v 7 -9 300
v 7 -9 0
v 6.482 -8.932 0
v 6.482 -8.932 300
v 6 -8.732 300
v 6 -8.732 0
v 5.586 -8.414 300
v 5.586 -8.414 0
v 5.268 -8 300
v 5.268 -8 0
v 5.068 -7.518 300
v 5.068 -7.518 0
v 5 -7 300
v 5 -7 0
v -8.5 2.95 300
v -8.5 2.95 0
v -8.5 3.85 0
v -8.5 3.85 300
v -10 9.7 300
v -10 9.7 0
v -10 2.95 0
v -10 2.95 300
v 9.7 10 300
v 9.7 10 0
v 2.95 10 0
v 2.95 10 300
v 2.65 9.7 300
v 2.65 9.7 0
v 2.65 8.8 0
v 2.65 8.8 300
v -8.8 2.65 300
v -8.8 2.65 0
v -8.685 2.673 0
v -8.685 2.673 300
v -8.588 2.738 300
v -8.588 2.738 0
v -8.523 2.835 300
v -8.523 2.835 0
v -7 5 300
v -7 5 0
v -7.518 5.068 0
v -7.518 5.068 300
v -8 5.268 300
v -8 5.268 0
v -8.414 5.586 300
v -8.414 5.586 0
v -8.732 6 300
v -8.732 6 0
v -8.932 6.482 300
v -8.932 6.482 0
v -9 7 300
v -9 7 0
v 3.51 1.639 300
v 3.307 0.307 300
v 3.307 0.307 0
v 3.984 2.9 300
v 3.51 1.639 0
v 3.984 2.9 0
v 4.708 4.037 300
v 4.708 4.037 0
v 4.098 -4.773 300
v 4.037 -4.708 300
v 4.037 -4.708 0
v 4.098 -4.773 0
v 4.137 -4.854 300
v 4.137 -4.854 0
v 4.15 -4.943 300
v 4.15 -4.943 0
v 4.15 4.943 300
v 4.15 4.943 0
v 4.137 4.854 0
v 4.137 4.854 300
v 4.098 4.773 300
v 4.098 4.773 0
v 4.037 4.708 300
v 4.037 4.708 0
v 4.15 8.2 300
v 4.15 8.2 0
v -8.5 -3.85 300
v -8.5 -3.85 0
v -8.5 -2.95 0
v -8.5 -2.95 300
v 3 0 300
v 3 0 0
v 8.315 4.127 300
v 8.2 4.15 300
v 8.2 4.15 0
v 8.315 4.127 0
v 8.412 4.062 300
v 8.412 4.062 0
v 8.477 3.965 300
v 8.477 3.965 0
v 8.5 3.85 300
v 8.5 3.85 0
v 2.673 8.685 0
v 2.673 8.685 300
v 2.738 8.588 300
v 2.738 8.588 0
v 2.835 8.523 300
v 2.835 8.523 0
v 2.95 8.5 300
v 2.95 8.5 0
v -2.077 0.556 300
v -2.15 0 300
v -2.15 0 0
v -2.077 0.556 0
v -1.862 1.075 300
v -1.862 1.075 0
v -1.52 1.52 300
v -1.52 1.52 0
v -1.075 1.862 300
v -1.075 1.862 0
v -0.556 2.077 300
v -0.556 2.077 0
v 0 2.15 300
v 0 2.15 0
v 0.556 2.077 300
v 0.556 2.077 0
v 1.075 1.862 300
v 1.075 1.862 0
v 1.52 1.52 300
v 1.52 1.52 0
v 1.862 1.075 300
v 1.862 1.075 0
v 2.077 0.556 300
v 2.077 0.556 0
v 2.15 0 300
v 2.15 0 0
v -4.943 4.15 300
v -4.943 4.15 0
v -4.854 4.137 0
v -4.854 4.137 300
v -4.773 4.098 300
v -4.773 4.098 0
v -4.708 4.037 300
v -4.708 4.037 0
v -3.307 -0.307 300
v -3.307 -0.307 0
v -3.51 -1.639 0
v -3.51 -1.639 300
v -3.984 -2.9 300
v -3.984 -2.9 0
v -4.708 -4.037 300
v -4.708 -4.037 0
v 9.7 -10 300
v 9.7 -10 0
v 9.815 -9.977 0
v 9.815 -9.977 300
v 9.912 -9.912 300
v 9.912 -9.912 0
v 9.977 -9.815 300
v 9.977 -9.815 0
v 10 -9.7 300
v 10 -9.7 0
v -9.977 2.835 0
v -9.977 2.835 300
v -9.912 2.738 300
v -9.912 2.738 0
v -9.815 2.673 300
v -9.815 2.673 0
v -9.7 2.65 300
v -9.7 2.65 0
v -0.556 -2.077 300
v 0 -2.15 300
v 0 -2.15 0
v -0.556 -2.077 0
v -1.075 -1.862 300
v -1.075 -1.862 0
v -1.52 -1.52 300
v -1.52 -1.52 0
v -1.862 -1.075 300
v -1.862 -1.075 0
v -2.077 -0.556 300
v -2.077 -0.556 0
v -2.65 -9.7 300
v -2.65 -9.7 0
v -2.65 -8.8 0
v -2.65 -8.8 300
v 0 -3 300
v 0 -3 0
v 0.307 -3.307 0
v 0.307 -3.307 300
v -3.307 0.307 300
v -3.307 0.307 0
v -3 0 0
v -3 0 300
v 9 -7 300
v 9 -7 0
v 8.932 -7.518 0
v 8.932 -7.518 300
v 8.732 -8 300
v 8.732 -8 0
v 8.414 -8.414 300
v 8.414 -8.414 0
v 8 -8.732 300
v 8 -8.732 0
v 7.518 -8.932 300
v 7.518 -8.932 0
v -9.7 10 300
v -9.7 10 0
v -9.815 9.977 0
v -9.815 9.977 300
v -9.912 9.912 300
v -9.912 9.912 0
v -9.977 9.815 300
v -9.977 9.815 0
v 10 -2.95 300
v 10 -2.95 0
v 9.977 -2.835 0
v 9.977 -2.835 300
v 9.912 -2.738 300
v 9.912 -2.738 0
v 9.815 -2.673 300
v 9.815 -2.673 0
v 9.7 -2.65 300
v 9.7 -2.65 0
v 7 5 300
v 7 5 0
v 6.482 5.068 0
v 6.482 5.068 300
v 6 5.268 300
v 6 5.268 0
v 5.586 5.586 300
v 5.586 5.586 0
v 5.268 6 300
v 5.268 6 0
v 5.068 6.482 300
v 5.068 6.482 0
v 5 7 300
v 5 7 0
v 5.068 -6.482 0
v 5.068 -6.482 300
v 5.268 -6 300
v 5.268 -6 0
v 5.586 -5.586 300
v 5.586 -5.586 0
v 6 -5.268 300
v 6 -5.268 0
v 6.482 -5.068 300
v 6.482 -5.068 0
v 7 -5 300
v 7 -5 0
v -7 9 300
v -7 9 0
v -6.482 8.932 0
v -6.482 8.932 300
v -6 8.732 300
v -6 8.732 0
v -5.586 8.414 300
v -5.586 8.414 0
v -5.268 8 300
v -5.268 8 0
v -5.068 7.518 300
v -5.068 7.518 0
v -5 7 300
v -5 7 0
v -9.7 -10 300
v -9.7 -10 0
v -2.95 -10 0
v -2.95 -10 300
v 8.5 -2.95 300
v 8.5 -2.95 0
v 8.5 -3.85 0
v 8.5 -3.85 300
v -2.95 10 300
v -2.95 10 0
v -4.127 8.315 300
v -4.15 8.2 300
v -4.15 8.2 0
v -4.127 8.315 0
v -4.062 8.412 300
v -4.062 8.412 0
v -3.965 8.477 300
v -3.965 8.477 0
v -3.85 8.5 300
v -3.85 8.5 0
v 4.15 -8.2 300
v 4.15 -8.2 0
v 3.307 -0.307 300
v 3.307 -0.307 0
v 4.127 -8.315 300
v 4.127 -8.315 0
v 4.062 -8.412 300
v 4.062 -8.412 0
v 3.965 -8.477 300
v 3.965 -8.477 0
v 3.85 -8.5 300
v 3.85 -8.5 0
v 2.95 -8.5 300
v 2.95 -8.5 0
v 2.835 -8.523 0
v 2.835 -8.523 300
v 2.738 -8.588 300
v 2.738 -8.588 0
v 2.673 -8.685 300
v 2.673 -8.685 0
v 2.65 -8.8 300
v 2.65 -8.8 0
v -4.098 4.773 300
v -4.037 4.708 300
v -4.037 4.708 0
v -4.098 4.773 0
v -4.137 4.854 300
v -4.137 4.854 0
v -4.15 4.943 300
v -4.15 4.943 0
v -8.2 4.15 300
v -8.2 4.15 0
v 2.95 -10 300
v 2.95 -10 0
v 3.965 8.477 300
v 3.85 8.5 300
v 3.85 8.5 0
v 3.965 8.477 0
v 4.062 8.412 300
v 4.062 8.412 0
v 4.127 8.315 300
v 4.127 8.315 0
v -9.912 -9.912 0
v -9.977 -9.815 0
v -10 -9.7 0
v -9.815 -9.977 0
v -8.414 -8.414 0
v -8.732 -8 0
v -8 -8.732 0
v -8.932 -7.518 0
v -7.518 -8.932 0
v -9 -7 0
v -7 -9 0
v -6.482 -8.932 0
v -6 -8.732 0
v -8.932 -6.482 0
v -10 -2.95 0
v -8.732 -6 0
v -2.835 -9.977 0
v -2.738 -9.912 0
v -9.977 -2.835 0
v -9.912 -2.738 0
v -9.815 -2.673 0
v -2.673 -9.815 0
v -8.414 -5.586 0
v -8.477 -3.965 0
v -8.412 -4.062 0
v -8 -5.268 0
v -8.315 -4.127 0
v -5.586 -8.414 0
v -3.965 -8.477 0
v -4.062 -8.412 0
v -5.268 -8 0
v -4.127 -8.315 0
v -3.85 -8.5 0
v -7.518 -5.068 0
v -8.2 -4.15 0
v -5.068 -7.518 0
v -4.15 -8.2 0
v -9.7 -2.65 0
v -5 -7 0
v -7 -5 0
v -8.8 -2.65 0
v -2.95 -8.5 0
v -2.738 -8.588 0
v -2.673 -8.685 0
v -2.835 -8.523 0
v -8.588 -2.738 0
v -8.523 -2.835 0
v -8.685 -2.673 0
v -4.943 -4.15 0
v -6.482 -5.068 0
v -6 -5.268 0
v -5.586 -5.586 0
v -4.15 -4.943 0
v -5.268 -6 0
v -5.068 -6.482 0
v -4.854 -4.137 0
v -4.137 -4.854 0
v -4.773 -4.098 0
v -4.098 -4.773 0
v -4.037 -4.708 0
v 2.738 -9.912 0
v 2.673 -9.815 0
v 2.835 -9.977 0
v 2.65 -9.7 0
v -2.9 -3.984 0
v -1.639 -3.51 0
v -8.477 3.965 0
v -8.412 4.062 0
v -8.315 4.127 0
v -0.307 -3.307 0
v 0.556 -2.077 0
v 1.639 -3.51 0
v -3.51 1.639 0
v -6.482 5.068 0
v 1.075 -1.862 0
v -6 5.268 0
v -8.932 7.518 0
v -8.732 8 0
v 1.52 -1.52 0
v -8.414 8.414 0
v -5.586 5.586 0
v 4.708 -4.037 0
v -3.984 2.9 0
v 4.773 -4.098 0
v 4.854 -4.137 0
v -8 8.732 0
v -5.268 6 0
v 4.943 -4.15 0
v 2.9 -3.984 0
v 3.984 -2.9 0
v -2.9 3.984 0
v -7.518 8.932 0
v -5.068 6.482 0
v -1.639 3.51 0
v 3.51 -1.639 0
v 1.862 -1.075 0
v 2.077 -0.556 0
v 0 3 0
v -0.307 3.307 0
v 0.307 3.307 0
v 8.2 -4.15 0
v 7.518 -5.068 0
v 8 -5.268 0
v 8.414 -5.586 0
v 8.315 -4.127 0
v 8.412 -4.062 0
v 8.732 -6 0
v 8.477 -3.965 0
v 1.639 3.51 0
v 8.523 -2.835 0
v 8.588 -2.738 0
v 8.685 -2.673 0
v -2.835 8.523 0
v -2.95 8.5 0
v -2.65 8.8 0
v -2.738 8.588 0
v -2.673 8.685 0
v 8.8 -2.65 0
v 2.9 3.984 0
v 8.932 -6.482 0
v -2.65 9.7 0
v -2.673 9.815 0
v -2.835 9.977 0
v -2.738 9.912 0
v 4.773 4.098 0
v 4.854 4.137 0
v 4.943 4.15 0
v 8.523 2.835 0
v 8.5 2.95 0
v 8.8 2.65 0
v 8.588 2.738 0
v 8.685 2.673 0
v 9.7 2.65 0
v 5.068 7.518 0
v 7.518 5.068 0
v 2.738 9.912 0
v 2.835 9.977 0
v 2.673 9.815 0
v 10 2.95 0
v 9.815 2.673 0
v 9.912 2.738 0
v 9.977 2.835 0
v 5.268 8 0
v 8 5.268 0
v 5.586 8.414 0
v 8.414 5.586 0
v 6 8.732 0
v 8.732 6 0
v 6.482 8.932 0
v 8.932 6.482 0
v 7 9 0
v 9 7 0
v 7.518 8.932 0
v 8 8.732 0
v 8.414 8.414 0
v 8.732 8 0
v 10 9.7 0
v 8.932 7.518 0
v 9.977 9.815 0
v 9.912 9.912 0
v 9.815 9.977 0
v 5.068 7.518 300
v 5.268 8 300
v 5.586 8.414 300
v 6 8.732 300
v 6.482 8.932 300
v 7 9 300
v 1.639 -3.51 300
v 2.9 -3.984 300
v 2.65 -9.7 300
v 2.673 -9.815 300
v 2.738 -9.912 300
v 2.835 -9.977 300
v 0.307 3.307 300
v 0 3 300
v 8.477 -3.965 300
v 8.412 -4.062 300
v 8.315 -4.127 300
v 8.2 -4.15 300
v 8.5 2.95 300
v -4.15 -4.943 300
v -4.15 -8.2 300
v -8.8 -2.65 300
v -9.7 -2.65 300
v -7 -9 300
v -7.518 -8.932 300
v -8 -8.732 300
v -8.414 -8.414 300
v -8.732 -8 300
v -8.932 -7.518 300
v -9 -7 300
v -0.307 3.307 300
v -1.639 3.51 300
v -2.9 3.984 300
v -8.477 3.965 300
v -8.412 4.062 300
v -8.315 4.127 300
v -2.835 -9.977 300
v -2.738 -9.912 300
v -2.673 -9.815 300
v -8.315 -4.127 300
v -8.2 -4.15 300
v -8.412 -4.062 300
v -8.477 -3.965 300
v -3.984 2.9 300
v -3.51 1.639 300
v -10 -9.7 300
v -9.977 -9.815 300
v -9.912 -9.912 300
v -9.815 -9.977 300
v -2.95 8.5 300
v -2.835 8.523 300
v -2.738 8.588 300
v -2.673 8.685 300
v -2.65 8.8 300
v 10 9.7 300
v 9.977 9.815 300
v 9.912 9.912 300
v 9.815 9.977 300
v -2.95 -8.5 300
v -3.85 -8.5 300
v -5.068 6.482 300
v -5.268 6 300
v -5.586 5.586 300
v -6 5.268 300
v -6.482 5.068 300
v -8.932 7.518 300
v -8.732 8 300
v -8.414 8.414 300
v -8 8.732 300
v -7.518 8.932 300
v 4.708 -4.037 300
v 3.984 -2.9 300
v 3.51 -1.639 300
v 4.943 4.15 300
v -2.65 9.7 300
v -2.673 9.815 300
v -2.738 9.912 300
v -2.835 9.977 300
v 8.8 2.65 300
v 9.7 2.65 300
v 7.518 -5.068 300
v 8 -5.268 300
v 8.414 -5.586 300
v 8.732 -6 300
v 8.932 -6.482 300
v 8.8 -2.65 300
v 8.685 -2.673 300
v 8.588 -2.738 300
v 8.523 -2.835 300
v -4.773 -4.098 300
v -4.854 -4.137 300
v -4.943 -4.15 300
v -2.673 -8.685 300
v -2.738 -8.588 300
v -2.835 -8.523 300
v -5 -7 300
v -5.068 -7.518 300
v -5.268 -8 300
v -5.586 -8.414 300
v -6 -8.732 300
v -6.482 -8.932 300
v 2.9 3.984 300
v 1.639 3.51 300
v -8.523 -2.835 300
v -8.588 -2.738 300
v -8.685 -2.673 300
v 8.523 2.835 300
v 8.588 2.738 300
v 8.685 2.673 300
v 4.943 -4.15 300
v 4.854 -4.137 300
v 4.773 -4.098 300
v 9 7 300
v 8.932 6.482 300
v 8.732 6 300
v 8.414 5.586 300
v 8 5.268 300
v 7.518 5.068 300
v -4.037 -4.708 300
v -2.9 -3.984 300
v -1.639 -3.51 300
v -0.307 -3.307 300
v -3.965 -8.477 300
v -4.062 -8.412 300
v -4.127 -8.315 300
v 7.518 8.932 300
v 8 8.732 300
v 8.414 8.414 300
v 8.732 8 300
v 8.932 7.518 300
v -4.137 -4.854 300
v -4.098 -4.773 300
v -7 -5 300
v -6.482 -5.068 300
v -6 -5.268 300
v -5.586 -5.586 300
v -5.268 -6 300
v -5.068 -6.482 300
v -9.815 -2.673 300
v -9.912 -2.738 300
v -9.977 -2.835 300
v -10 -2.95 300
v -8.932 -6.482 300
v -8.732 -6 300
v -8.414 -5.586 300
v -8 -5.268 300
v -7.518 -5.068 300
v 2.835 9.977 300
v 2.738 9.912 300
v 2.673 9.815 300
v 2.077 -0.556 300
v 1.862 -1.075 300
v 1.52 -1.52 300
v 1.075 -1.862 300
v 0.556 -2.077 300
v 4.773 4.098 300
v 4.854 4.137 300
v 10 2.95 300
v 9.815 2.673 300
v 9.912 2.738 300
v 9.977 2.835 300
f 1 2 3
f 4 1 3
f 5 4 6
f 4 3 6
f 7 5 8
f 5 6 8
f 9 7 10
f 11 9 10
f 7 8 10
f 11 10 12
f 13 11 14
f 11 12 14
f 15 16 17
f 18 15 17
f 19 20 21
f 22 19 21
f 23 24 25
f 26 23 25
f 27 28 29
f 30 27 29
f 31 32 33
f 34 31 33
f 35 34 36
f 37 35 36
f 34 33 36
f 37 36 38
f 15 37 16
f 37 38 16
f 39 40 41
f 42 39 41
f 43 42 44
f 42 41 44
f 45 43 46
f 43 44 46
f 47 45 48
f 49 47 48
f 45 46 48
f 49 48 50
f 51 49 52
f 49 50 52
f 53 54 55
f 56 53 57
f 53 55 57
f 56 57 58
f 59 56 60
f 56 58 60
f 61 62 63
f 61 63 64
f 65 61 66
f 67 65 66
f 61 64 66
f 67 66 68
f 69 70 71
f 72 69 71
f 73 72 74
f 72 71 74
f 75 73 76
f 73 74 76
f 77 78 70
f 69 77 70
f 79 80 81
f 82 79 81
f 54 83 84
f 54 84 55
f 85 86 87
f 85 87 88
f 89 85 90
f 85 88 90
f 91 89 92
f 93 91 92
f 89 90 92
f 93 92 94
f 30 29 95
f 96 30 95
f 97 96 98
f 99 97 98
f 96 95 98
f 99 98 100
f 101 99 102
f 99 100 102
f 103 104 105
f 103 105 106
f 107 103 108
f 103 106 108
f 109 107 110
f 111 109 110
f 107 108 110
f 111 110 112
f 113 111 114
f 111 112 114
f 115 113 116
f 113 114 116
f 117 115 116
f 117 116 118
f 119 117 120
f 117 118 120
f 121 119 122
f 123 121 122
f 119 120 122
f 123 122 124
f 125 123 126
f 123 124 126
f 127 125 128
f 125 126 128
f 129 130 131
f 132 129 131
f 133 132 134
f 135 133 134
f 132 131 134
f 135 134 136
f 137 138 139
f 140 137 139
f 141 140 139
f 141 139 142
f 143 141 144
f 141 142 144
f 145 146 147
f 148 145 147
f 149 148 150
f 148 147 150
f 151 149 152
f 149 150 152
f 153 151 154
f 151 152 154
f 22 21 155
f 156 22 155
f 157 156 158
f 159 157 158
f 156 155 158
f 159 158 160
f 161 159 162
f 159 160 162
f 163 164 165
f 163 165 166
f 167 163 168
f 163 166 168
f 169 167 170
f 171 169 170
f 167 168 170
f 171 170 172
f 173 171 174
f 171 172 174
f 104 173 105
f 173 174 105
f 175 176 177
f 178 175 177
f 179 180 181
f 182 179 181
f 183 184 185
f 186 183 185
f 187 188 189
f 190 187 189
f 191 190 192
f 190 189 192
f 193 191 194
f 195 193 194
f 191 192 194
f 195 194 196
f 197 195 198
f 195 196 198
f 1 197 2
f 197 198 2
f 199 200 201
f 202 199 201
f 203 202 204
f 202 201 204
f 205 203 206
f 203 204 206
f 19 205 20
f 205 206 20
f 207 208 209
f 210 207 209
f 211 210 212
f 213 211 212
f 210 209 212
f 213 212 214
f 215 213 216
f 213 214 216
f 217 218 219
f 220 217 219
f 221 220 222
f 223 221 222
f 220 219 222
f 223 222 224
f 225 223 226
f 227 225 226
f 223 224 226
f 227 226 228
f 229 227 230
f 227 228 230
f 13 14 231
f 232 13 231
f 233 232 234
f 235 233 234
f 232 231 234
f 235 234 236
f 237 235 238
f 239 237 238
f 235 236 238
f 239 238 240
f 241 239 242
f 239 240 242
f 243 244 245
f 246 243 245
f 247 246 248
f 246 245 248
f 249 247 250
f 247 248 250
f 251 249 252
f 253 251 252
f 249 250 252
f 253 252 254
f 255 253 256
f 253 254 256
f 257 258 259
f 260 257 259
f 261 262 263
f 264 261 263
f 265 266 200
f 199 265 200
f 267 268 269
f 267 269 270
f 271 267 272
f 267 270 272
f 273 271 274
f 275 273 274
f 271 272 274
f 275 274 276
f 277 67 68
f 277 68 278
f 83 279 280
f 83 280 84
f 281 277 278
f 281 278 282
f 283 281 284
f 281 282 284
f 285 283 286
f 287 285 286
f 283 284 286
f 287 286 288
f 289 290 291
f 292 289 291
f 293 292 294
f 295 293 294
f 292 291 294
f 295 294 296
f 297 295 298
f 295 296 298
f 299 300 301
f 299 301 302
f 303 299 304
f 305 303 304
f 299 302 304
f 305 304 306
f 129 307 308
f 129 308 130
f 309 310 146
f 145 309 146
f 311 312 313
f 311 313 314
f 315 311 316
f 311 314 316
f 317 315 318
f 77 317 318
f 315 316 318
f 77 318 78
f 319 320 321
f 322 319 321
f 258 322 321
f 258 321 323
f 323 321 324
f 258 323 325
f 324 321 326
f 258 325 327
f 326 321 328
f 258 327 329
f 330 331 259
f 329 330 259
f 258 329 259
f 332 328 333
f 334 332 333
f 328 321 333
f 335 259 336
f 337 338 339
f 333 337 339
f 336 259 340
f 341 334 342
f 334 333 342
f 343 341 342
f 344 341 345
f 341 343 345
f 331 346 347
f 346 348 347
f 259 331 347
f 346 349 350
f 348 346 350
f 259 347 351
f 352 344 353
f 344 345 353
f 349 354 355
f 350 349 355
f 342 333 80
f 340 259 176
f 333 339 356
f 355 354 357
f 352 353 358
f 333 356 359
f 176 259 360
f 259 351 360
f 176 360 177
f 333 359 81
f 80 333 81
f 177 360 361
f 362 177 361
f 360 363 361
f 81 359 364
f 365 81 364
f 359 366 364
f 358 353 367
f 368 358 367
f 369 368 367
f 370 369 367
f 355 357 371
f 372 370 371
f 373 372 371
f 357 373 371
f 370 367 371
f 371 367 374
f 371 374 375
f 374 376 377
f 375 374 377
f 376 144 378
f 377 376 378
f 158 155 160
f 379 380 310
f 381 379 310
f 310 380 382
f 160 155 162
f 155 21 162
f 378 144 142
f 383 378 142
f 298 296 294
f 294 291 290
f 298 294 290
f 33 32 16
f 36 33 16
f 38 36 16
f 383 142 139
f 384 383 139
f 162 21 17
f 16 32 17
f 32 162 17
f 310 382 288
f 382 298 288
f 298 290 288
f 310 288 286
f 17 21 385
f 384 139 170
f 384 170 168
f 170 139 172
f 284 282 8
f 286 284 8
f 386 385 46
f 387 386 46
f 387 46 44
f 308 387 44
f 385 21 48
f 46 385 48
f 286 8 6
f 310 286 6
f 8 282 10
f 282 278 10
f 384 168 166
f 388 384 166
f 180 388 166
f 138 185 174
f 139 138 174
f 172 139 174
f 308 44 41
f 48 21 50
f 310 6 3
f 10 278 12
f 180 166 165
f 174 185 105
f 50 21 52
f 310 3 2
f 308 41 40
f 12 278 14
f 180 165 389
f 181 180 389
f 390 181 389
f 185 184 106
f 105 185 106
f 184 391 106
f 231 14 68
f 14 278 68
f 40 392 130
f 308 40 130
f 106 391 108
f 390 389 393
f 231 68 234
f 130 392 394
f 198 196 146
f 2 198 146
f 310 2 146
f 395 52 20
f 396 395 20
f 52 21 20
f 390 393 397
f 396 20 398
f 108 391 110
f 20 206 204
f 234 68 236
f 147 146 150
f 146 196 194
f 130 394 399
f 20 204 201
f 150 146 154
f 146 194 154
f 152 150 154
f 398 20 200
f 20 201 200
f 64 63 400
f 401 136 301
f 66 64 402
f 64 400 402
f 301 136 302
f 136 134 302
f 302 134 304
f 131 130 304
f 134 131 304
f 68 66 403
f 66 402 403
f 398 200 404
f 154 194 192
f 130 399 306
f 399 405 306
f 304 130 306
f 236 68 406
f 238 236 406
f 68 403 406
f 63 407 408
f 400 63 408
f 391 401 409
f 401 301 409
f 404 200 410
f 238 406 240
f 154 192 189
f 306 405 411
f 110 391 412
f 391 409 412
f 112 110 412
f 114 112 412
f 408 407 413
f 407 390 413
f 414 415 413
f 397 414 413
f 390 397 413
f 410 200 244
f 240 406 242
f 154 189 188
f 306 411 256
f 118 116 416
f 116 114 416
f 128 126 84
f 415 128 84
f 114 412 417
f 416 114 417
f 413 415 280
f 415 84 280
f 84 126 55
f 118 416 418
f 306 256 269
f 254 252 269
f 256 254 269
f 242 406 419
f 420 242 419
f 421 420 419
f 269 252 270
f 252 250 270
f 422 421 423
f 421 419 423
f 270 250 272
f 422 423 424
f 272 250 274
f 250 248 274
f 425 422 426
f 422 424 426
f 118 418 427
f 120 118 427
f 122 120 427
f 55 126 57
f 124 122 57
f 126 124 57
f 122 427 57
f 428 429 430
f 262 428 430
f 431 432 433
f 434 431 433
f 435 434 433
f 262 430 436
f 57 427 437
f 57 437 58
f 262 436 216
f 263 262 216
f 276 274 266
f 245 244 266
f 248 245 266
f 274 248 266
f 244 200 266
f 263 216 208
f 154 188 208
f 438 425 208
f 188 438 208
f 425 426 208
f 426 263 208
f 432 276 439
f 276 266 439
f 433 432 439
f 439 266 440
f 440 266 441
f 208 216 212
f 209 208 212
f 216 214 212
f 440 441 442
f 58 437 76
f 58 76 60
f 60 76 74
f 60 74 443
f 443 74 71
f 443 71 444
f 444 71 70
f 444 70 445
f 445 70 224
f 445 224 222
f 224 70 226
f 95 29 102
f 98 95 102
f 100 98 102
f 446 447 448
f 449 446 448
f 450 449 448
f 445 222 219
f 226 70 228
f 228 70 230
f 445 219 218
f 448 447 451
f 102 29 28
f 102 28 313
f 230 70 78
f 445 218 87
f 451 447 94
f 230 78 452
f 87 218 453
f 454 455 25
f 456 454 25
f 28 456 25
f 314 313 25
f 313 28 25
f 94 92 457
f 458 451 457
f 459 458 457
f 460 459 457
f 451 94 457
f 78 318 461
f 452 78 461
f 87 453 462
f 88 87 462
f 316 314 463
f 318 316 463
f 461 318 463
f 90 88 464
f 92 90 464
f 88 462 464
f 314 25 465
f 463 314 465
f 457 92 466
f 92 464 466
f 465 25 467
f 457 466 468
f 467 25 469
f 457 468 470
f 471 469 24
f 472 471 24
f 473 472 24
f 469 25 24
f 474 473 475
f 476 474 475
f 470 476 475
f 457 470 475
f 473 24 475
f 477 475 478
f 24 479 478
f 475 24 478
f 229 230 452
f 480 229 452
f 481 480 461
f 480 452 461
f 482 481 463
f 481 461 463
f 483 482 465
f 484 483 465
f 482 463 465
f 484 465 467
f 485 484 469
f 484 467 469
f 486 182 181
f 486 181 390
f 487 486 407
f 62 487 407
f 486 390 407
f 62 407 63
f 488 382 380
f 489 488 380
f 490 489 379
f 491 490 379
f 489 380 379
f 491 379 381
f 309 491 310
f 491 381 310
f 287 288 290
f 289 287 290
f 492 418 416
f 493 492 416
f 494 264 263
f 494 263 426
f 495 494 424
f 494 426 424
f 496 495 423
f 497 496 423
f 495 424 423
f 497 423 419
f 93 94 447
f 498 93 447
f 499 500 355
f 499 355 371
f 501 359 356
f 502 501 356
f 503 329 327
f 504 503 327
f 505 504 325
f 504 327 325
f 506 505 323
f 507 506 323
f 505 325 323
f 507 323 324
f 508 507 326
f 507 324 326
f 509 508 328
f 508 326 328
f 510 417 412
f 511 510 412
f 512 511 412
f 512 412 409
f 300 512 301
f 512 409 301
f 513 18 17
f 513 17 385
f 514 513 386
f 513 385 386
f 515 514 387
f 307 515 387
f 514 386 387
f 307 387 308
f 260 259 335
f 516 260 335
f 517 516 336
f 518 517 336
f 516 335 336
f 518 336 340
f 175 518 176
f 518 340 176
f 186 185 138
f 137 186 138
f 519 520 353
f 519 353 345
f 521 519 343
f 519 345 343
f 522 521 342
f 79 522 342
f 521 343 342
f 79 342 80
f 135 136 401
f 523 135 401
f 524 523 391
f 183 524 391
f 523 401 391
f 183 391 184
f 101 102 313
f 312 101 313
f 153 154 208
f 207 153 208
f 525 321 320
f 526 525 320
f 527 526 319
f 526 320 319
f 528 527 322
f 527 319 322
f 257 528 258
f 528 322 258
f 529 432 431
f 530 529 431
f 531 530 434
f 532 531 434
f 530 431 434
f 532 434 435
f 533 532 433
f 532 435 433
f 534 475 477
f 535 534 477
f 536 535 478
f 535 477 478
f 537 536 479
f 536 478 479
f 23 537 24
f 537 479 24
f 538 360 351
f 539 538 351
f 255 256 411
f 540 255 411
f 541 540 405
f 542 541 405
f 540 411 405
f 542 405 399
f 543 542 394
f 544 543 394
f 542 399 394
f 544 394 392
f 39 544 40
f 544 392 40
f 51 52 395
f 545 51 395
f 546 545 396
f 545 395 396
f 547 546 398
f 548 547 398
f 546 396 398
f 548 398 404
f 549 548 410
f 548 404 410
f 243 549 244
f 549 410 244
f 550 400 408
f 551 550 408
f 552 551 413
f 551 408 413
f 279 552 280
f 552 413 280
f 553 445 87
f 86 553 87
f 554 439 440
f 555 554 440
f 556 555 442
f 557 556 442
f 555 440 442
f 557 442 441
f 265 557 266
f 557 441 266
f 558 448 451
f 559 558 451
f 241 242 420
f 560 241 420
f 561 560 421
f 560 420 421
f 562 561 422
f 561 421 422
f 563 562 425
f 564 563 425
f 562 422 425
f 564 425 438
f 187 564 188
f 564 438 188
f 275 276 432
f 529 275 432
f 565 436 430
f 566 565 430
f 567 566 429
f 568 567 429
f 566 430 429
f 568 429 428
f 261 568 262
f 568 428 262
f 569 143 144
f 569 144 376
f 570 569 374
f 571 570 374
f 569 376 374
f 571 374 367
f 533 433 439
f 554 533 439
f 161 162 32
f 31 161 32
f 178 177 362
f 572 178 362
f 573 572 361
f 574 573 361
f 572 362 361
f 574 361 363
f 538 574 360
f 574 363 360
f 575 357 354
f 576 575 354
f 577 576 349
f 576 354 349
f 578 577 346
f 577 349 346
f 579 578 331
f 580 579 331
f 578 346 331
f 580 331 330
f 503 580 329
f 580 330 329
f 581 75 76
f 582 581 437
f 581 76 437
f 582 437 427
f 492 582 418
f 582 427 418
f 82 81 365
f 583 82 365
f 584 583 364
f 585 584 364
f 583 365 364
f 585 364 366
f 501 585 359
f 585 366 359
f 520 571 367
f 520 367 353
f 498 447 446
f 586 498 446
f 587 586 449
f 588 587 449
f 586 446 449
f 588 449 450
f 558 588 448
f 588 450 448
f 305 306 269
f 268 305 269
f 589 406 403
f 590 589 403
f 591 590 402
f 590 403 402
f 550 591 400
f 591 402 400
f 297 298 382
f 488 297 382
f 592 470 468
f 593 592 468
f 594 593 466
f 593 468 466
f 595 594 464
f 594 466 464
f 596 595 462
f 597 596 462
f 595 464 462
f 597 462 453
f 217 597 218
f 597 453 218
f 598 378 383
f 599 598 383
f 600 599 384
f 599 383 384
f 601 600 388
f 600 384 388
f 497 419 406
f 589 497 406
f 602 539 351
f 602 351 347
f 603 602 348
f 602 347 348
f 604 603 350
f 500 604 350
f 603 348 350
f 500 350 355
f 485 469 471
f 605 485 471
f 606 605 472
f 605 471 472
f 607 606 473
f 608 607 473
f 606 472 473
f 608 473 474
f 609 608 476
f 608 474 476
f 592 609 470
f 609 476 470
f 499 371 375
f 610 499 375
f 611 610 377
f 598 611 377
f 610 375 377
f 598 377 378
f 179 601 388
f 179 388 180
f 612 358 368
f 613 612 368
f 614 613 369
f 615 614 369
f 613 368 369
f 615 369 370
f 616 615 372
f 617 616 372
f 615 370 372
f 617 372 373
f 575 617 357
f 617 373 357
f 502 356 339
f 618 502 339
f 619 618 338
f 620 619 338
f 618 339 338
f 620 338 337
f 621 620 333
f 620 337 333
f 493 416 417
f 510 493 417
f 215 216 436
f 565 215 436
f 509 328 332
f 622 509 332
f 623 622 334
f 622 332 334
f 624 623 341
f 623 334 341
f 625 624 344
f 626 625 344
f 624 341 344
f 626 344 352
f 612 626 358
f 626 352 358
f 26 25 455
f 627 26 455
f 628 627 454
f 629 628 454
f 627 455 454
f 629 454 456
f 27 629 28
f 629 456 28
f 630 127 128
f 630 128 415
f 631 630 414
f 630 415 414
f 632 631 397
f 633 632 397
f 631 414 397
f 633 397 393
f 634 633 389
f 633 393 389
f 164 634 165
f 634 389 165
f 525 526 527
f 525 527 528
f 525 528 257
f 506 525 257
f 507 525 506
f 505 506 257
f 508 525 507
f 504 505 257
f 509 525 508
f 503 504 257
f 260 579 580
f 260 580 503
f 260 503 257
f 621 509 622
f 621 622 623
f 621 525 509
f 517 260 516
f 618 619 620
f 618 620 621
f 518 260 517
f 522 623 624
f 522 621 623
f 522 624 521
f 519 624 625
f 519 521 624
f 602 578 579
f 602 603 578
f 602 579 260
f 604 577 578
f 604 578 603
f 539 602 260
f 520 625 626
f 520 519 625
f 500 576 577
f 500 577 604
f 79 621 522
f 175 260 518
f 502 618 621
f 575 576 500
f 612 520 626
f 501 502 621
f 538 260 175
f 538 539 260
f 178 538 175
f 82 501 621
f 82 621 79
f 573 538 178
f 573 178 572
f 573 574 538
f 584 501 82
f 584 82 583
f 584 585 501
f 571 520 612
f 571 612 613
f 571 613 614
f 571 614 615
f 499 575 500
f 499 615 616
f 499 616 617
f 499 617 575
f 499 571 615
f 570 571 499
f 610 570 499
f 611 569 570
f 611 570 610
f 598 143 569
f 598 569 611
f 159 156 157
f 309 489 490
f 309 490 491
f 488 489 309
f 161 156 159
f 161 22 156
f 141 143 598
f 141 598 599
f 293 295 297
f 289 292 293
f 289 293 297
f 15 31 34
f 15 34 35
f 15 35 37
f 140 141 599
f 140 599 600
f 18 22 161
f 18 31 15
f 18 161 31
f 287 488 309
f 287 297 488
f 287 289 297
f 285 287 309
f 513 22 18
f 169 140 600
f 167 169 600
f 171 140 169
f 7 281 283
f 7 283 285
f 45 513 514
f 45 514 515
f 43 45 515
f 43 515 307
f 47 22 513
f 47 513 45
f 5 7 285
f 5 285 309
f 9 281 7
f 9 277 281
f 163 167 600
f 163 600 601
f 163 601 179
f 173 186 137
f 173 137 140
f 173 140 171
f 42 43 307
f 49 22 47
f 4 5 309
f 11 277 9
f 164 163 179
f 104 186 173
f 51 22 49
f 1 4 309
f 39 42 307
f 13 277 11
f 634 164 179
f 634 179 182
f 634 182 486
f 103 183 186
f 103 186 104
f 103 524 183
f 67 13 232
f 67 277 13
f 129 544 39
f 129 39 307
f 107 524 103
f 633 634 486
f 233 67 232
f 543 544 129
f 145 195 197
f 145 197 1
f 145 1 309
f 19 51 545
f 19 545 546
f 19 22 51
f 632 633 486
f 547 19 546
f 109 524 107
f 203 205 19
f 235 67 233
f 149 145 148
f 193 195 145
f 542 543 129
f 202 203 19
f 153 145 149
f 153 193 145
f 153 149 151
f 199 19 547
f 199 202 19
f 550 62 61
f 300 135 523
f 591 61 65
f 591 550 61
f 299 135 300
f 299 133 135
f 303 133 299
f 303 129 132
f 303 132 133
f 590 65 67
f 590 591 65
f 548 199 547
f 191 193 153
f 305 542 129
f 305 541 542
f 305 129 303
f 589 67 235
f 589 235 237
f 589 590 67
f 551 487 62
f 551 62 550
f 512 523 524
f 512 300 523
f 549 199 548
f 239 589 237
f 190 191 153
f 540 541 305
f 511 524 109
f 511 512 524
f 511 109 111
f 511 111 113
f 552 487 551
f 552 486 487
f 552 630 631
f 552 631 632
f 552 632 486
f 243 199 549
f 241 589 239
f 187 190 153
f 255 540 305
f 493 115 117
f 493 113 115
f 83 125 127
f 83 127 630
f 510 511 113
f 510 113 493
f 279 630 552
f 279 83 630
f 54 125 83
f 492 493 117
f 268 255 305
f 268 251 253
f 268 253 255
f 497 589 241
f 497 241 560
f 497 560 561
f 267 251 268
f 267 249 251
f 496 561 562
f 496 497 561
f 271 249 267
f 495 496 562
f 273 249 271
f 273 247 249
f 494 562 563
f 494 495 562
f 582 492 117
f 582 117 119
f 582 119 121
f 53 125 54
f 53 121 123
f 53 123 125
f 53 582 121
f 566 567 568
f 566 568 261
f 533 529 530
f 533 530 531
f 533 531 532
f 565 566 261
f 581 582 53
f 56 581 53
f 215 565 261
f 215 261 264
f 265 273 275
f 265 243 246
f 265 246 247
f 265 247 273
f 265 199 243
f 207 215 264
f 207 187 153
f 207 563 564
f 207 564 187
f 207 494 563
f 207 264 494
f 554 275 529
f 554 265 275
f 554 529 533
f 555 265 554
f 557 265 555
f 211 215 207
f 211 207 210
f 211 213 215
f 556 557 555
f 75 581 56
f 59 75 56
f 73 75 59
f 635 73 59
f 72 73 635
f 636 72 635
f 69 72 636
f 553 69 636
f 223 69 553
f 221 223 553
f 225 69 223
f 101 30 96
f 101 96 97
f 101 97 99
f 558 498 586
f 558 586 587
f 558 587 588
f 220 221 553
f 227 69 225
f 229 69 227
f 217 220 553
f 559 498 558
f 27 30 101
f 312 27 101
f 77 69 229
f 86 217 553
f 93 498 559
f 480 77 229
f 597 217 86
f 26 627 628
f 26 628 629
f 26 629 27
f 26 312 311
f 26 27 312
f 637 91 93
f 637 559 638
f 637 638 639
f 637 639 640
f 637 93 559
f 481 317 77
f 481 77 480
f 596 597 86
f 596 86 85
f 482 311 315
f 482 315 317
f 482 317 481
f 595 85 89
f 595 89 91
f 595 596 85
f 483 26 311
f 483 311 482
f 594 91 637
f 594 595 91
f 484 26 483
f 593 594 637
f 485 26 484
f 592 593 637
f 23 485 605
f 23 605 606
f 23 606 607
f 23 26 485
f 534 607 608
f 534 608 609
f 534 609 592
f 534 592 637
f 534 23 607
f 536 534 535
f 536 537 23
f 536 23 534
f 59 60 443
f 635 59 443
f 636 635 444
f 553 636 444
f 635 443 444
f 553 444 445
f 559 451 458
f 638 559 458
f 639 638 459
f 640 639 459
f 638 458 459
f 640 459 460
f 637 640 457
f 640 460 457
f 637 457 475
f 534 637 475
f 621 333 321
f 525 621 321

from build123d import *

# Parameters (mm, degrees)
F1_DEPTH = 300


# Not quite as in the source:
# - ends of sketch curves that miss each other by under 0.0002 mm in the source are joined


with BuildPart() as f1:
    # F0 (on Top) → F1 (new body)
    with BuildSketch(Plane.XY):
        with BuildLine():
            ThreePointArc((0, 2.15), (1.5202795796, 1.5202795796), (2.15, 0))
            Line((2.15, 0), (3, 0))
            Line((3, 0), (3.307278, 0.307278))
            ThreePointArc((3.307278, 0.307278), (3.7143803747, 2.2820219924), (4.7078187099, 4.0365664363))
            ThreePointArc((4.7078187099, 4.0365664363), (4.812308461, 4.1201573706), (4.94275, 4.15))
            Line((4.94275, 4.15), (8.2, 4.15))
            ThreePointArc((8.2, 4.15), (8.4121320344, 4.0621320344), (8.5, 3.85))
            Line((8.5, 3.85), (8.5, 2.95))
            ThreePointArc((8.5, 2.95), (8.5878679656, 2.7378679656), (8.8, 2.65))
            Line((8.8, 2.65), (9.7, 2.65))
            ThreePointArc((9.7, 2.65), (9.9121320344, 2.7378679656), (10, 2.95))
            Line((10, 2.95), (10, 9.7))
            ThreePointArc((10, 9.7), (9.9121320344, 9.9121320344), (9.7, 10))
            Line((9.7, 10), (2.95, 10))
            ThreePointArc((2.95, 10), (2.7378679656, 9.9121320344), (2.65, 9.7))
            Line((2.65, 9.7), (2.65, 8.8))
            ThreePointArc((2.65, 8.8), (2.7378679656, 8.5878679656), (2.95, 8.5))
            Line((2.95, 8.5), (3.85, 8.5))
            ThreePointArc((3.85, 8.5), (4.0621320344, 8.4121320344), (4.15, 8.2))
            Line((4.15, 8.2), (4.15, 4.94275))
            ThreePointArc((4.15, 4.94275), (4.1201572004, 4.8123081084), (4.036566086, 4.7078178916))
            ThreePointArc((4.036566086, 4.7078178916), (2.2820216259, 3.7143802371), (0.3072779813, 3.3072783955))
            Line((0.3072779813, 3.3072783955), (0, 3))
            Line((0, 3), (0, 2.15))
        make_face()
        with BuildLine():
            ThreePointArc((7, 9), (8.4142135624, 8.4142135624), (9, 7))
            ThreePointArc((9, 7), (8.4142135624, 5.5857864376), (7, 5))
            ThreePointArc((7, 5), (5.5857864376, 5.5857864376), (5, 7))
            ThreePointArc((5, 7), (5.5857864376, 8.4142135624), (7, 9))
        make_face(mode=Mode.SUBTRACT)
        with BuildLine():
            Line((3, 0), (2.15, 0))
            ThreePointArc((2.15, 0), (1.5202795796, -1.5202795796), (0, -2.15))
            Line((0, -2.15), (0, -3))
            Line((0, -3), (0.307278, -3.307277))
            ThreePointArc((0.307278, -3.307277), (2.2820216259, -3.7143792371), (4.036565823, -4.7078172229))
            ThreePointArc((4.036565823, -4.7078172229), (4.1201572004, -4.8123071084), (4.15, -4.942749))
            Line((4.15, -4.942749), (4.15, -8.2))
            ThreePointArc((4.15, -8.2), (4.0621320344, -8.4121320344), (3.85, -8.5))
            Line((3.85, -8.5), (2.95, -8.5))
            ThreePointArc((2.95, -8.5), (2.7378679656, -8.5878679656), (2.65, -8.8))
            Line((2.65, -8.8), (2.65, -9.7))
            ThreePointArc((2.65, -9.7), (2.7378679656, -9.9121320344), (2.95, -10))
            Line((2.95, -10), (9.7, -10))
            ThreePointArc((9.7, -10), (9.9121320344, -9.9121320344), (10, -9.7))
            Line((10, -9.7), (10, -2.95))
            ThreePointArc((10, -2.95), (9.9121320344, -2.7378679656), (9.7, -2.65))
            Line((9.7, -2.65), (8.8, -2.65))
            ThreePointArc((8.8, -2.65), (8.5878679656, -2.7378679656), (8.5, -2.95))
            Line((8.5, -2.95), (8.5, -3.85))
            ThreePointArc((8.5, -3.85), (8.4121320344, -4.0621320344), (8.2, -4.15))
            Line((8.2, -4.15), (4.94275, -4.15))
            ThreePointArc((4.94275, -4.15), (4.8123081084, -4.1201572004), (4.7078178916, -4.036566086))
            ThreePointArc((4.7078178916, -4.036566086), (3.7143800615, -2.2820211583), (3.3072783483, -0.3072769835))
            Line((3.3072783483, -0.3072769835), (3, 0))
        make_face()
        with BuildLine():
            ThreePointArc((7, -5), (8.4142135624, -5.5857864376), (9, -7))
            ThreePointArc((9, -7), (8.4142135624, -8.4142135624), (7, -9))
            ThreePointArc((7, -9), (5.5857864376, -8.4142135624), (5, -7))
            ThreePointArc((5, -7), (5.5857864376, -5.5857864376), (7, -5))
        make_face(mode=Mode.SUBTRACT)
        with BuildLine():
            ThreePointArc((-2.15, 0), (-1.5202795796, 1.5202795796), (0, 2.15))
            Line((0, 2.15), (0, 3))
            Line((0, 3), (-0.307277, 3.307278))
            ThreePointArc((-0.307277, 3.307278), (-2.2820211583, 3.7143800615), (-4.036565823, 4.7078182229))
            ThreePointArc((-4.036565823, 4.7078182229), (-4.1201572004, 4.8123081084), (-4.15, 4.94275))
            Line((-4.15, 4.94275), (-4.15, 8.2))
            ThreePointArc((-4.15, 8.2), (-4.0621320344, 8.4121320344), (-3.85, 8.5))
            Line((-3.85, 8.5), (-2.95, 8.5))
            ThreePointArc((-2.95, 8.5), (-2.7378679656, 8.5878679656), (-2.65, 8.8))
            Line((-2.65, 8.8), (-2.65, 9.7))
            ThreePointArc((-2.65, 9.7), (-2.7378679656, 9.9121320344), (-2.95, 10))
            Line((-2.95, 10), (-9.7, 10))
            ThreePointArc((-9.7, 10), (-9.9121320344, 9.9121320344), (-10, 9.7))
            Line((-10, 9.7), (-10, 2.95))
            ThreePointArc((-10, 2.95), (-9.9121320344, 2.7378679656), (-9.7, 2.65))
            Line((-9.7, 2.65), (-8.8, 2.65))
            ThreePointArc((-8.8, 2.65), (-8.5878679656, 2.7378679656), (-8.5, 2.95))
            Line((-8.5, 2.95), (-8.5, 3.85))
            ThreePointArc((-8.5, 3.85), (-8.4121320344, 4.0621320344), (-8.2, 4.15))
            Line((-8.2, 4.15), (-4.942749, 4.15))
            ThreePointArc((-4.942749, 4.15), (-4.812307461, 4.1201573706), (-4.7078173786, 4.0365666993))
            ThreePointArc((-4.7078173786, 4.0365666993), (-3.7143793747, 2.2820219924), (-3.3072773955, 0.3072779813))
            Line((-3.3072773955, 0.3072779813), (-3, 0))
            Line((-3, 0), (-2.15, 0))
        make_face()
        with BuildLine():
            ThreePointArc((-7, 5), (-8.4142135624, 5.5857864376), (-9, 7))
            ThreePointArc((-9, 7), (-8.4142135624, 8.4142135624), (-7, 9))
            ThreePointArc((-7, 9), (-5.5857864376, 8.4142135624), (-5, 7))
            ThreePointArc((-5, 7), (-5.5857864376, 5.5857864376), (-7, 5))
        make_face(mode=Mode.SUBTRACT)
        with BuildLine():
            Line((0, -3), (0, -2.15))
            ThreePointArc((0, -2.15), (-1.5202795796, -1.5202795796), (-2.15, 0))
            Line((-2.15, 0), (-3, 0))
            Line((-3, 0), (-3.307277, -0.307277))
            ThreePointArc((-3.307277, -0.307277), (-3.7143790615, -2.2820211583), (-4.7078172229, -4.036565823))
            ThreePointArc((-4.7078172229, -4.036565823), (-4.8123071084, -4.1201572004), (-4.942749, -4.15))
            Line((-4.942749, -4.15), (-8.2, -4.15))
            ThreePointArc((-8.2, -4.15), (-8.4121320344, -4.0621320344), (-8.5, -3.85))
            Line((-8.5, -3.85), (-8.5, -2.95))
            ThreePointArc((-8.5, -2.95), (-8.5878679656, -2.7378679656), (-8.8, -2.65))
            Line((-8.8, -2.65), (-9.7, -2.65))
            ThreePointArc((-9.7, -2.65), (-9.9121320344, -2.7378679656), (-10, -2.95))
            Line((-10, -2.95), (-10, -9.7))
            ThreePointArc((-10, -9.7), (-9.9121320344, -9.9121320344), (-9.7, -10))
            Line((-9.7, -10), (-2.95, -10))
            ThreePointArc((-2.95, -10), (-2.7378679656, -9.9121320344), (-2.65, -9.7))
            Line((-2.65, -9.7), (-2.65, -8.8))
            ThreePointArc((-2.65, -8.8), (-2.7378679656, -8.5878679656), (-2.95, -8.5))
            Line((-2.95, -8.5), (-3.85, -8.5))
            ThreePointArc((-3.85, -8.5), (-4.0621320344, -8.4121320344), (-4.15, -8.2))
            Line((-4.15, -8.2), (-4.15, -4.942749))
            ThreePointArc((-4.15, -4.942749), (-4.1201572004, -4.8123071084), (-4.036566086, -4.7078168916))
            ThreePointArc((-4.036566086, -4.7078168916), (-2.2820211583, -3.7143790615), (-0.3072769835, -3.3072773483))
            Line((-0.3072769835, -3.3072773483), (0, -3))
        make_face()
        with BuildLine():
            ThreePointArc((-7, -9), (-8.4142135624, -8.4142135624), (-9, -7))
            ThreePointArc((-9, -7), (-8.4142135624, -5.5857864376), (-7, -5))
            ThreePointArc((-7, -5), (-5.5857864376, -5.5857864376), (-5, -7))
            ThreePointArc((-5, -7), (-5.5857864376, -8.4142135624), (-7, -9))
        make_face(mode=Mode.SUBTRACT)
    extrude(amount=F1_DEPTH)


solid = f1.part
